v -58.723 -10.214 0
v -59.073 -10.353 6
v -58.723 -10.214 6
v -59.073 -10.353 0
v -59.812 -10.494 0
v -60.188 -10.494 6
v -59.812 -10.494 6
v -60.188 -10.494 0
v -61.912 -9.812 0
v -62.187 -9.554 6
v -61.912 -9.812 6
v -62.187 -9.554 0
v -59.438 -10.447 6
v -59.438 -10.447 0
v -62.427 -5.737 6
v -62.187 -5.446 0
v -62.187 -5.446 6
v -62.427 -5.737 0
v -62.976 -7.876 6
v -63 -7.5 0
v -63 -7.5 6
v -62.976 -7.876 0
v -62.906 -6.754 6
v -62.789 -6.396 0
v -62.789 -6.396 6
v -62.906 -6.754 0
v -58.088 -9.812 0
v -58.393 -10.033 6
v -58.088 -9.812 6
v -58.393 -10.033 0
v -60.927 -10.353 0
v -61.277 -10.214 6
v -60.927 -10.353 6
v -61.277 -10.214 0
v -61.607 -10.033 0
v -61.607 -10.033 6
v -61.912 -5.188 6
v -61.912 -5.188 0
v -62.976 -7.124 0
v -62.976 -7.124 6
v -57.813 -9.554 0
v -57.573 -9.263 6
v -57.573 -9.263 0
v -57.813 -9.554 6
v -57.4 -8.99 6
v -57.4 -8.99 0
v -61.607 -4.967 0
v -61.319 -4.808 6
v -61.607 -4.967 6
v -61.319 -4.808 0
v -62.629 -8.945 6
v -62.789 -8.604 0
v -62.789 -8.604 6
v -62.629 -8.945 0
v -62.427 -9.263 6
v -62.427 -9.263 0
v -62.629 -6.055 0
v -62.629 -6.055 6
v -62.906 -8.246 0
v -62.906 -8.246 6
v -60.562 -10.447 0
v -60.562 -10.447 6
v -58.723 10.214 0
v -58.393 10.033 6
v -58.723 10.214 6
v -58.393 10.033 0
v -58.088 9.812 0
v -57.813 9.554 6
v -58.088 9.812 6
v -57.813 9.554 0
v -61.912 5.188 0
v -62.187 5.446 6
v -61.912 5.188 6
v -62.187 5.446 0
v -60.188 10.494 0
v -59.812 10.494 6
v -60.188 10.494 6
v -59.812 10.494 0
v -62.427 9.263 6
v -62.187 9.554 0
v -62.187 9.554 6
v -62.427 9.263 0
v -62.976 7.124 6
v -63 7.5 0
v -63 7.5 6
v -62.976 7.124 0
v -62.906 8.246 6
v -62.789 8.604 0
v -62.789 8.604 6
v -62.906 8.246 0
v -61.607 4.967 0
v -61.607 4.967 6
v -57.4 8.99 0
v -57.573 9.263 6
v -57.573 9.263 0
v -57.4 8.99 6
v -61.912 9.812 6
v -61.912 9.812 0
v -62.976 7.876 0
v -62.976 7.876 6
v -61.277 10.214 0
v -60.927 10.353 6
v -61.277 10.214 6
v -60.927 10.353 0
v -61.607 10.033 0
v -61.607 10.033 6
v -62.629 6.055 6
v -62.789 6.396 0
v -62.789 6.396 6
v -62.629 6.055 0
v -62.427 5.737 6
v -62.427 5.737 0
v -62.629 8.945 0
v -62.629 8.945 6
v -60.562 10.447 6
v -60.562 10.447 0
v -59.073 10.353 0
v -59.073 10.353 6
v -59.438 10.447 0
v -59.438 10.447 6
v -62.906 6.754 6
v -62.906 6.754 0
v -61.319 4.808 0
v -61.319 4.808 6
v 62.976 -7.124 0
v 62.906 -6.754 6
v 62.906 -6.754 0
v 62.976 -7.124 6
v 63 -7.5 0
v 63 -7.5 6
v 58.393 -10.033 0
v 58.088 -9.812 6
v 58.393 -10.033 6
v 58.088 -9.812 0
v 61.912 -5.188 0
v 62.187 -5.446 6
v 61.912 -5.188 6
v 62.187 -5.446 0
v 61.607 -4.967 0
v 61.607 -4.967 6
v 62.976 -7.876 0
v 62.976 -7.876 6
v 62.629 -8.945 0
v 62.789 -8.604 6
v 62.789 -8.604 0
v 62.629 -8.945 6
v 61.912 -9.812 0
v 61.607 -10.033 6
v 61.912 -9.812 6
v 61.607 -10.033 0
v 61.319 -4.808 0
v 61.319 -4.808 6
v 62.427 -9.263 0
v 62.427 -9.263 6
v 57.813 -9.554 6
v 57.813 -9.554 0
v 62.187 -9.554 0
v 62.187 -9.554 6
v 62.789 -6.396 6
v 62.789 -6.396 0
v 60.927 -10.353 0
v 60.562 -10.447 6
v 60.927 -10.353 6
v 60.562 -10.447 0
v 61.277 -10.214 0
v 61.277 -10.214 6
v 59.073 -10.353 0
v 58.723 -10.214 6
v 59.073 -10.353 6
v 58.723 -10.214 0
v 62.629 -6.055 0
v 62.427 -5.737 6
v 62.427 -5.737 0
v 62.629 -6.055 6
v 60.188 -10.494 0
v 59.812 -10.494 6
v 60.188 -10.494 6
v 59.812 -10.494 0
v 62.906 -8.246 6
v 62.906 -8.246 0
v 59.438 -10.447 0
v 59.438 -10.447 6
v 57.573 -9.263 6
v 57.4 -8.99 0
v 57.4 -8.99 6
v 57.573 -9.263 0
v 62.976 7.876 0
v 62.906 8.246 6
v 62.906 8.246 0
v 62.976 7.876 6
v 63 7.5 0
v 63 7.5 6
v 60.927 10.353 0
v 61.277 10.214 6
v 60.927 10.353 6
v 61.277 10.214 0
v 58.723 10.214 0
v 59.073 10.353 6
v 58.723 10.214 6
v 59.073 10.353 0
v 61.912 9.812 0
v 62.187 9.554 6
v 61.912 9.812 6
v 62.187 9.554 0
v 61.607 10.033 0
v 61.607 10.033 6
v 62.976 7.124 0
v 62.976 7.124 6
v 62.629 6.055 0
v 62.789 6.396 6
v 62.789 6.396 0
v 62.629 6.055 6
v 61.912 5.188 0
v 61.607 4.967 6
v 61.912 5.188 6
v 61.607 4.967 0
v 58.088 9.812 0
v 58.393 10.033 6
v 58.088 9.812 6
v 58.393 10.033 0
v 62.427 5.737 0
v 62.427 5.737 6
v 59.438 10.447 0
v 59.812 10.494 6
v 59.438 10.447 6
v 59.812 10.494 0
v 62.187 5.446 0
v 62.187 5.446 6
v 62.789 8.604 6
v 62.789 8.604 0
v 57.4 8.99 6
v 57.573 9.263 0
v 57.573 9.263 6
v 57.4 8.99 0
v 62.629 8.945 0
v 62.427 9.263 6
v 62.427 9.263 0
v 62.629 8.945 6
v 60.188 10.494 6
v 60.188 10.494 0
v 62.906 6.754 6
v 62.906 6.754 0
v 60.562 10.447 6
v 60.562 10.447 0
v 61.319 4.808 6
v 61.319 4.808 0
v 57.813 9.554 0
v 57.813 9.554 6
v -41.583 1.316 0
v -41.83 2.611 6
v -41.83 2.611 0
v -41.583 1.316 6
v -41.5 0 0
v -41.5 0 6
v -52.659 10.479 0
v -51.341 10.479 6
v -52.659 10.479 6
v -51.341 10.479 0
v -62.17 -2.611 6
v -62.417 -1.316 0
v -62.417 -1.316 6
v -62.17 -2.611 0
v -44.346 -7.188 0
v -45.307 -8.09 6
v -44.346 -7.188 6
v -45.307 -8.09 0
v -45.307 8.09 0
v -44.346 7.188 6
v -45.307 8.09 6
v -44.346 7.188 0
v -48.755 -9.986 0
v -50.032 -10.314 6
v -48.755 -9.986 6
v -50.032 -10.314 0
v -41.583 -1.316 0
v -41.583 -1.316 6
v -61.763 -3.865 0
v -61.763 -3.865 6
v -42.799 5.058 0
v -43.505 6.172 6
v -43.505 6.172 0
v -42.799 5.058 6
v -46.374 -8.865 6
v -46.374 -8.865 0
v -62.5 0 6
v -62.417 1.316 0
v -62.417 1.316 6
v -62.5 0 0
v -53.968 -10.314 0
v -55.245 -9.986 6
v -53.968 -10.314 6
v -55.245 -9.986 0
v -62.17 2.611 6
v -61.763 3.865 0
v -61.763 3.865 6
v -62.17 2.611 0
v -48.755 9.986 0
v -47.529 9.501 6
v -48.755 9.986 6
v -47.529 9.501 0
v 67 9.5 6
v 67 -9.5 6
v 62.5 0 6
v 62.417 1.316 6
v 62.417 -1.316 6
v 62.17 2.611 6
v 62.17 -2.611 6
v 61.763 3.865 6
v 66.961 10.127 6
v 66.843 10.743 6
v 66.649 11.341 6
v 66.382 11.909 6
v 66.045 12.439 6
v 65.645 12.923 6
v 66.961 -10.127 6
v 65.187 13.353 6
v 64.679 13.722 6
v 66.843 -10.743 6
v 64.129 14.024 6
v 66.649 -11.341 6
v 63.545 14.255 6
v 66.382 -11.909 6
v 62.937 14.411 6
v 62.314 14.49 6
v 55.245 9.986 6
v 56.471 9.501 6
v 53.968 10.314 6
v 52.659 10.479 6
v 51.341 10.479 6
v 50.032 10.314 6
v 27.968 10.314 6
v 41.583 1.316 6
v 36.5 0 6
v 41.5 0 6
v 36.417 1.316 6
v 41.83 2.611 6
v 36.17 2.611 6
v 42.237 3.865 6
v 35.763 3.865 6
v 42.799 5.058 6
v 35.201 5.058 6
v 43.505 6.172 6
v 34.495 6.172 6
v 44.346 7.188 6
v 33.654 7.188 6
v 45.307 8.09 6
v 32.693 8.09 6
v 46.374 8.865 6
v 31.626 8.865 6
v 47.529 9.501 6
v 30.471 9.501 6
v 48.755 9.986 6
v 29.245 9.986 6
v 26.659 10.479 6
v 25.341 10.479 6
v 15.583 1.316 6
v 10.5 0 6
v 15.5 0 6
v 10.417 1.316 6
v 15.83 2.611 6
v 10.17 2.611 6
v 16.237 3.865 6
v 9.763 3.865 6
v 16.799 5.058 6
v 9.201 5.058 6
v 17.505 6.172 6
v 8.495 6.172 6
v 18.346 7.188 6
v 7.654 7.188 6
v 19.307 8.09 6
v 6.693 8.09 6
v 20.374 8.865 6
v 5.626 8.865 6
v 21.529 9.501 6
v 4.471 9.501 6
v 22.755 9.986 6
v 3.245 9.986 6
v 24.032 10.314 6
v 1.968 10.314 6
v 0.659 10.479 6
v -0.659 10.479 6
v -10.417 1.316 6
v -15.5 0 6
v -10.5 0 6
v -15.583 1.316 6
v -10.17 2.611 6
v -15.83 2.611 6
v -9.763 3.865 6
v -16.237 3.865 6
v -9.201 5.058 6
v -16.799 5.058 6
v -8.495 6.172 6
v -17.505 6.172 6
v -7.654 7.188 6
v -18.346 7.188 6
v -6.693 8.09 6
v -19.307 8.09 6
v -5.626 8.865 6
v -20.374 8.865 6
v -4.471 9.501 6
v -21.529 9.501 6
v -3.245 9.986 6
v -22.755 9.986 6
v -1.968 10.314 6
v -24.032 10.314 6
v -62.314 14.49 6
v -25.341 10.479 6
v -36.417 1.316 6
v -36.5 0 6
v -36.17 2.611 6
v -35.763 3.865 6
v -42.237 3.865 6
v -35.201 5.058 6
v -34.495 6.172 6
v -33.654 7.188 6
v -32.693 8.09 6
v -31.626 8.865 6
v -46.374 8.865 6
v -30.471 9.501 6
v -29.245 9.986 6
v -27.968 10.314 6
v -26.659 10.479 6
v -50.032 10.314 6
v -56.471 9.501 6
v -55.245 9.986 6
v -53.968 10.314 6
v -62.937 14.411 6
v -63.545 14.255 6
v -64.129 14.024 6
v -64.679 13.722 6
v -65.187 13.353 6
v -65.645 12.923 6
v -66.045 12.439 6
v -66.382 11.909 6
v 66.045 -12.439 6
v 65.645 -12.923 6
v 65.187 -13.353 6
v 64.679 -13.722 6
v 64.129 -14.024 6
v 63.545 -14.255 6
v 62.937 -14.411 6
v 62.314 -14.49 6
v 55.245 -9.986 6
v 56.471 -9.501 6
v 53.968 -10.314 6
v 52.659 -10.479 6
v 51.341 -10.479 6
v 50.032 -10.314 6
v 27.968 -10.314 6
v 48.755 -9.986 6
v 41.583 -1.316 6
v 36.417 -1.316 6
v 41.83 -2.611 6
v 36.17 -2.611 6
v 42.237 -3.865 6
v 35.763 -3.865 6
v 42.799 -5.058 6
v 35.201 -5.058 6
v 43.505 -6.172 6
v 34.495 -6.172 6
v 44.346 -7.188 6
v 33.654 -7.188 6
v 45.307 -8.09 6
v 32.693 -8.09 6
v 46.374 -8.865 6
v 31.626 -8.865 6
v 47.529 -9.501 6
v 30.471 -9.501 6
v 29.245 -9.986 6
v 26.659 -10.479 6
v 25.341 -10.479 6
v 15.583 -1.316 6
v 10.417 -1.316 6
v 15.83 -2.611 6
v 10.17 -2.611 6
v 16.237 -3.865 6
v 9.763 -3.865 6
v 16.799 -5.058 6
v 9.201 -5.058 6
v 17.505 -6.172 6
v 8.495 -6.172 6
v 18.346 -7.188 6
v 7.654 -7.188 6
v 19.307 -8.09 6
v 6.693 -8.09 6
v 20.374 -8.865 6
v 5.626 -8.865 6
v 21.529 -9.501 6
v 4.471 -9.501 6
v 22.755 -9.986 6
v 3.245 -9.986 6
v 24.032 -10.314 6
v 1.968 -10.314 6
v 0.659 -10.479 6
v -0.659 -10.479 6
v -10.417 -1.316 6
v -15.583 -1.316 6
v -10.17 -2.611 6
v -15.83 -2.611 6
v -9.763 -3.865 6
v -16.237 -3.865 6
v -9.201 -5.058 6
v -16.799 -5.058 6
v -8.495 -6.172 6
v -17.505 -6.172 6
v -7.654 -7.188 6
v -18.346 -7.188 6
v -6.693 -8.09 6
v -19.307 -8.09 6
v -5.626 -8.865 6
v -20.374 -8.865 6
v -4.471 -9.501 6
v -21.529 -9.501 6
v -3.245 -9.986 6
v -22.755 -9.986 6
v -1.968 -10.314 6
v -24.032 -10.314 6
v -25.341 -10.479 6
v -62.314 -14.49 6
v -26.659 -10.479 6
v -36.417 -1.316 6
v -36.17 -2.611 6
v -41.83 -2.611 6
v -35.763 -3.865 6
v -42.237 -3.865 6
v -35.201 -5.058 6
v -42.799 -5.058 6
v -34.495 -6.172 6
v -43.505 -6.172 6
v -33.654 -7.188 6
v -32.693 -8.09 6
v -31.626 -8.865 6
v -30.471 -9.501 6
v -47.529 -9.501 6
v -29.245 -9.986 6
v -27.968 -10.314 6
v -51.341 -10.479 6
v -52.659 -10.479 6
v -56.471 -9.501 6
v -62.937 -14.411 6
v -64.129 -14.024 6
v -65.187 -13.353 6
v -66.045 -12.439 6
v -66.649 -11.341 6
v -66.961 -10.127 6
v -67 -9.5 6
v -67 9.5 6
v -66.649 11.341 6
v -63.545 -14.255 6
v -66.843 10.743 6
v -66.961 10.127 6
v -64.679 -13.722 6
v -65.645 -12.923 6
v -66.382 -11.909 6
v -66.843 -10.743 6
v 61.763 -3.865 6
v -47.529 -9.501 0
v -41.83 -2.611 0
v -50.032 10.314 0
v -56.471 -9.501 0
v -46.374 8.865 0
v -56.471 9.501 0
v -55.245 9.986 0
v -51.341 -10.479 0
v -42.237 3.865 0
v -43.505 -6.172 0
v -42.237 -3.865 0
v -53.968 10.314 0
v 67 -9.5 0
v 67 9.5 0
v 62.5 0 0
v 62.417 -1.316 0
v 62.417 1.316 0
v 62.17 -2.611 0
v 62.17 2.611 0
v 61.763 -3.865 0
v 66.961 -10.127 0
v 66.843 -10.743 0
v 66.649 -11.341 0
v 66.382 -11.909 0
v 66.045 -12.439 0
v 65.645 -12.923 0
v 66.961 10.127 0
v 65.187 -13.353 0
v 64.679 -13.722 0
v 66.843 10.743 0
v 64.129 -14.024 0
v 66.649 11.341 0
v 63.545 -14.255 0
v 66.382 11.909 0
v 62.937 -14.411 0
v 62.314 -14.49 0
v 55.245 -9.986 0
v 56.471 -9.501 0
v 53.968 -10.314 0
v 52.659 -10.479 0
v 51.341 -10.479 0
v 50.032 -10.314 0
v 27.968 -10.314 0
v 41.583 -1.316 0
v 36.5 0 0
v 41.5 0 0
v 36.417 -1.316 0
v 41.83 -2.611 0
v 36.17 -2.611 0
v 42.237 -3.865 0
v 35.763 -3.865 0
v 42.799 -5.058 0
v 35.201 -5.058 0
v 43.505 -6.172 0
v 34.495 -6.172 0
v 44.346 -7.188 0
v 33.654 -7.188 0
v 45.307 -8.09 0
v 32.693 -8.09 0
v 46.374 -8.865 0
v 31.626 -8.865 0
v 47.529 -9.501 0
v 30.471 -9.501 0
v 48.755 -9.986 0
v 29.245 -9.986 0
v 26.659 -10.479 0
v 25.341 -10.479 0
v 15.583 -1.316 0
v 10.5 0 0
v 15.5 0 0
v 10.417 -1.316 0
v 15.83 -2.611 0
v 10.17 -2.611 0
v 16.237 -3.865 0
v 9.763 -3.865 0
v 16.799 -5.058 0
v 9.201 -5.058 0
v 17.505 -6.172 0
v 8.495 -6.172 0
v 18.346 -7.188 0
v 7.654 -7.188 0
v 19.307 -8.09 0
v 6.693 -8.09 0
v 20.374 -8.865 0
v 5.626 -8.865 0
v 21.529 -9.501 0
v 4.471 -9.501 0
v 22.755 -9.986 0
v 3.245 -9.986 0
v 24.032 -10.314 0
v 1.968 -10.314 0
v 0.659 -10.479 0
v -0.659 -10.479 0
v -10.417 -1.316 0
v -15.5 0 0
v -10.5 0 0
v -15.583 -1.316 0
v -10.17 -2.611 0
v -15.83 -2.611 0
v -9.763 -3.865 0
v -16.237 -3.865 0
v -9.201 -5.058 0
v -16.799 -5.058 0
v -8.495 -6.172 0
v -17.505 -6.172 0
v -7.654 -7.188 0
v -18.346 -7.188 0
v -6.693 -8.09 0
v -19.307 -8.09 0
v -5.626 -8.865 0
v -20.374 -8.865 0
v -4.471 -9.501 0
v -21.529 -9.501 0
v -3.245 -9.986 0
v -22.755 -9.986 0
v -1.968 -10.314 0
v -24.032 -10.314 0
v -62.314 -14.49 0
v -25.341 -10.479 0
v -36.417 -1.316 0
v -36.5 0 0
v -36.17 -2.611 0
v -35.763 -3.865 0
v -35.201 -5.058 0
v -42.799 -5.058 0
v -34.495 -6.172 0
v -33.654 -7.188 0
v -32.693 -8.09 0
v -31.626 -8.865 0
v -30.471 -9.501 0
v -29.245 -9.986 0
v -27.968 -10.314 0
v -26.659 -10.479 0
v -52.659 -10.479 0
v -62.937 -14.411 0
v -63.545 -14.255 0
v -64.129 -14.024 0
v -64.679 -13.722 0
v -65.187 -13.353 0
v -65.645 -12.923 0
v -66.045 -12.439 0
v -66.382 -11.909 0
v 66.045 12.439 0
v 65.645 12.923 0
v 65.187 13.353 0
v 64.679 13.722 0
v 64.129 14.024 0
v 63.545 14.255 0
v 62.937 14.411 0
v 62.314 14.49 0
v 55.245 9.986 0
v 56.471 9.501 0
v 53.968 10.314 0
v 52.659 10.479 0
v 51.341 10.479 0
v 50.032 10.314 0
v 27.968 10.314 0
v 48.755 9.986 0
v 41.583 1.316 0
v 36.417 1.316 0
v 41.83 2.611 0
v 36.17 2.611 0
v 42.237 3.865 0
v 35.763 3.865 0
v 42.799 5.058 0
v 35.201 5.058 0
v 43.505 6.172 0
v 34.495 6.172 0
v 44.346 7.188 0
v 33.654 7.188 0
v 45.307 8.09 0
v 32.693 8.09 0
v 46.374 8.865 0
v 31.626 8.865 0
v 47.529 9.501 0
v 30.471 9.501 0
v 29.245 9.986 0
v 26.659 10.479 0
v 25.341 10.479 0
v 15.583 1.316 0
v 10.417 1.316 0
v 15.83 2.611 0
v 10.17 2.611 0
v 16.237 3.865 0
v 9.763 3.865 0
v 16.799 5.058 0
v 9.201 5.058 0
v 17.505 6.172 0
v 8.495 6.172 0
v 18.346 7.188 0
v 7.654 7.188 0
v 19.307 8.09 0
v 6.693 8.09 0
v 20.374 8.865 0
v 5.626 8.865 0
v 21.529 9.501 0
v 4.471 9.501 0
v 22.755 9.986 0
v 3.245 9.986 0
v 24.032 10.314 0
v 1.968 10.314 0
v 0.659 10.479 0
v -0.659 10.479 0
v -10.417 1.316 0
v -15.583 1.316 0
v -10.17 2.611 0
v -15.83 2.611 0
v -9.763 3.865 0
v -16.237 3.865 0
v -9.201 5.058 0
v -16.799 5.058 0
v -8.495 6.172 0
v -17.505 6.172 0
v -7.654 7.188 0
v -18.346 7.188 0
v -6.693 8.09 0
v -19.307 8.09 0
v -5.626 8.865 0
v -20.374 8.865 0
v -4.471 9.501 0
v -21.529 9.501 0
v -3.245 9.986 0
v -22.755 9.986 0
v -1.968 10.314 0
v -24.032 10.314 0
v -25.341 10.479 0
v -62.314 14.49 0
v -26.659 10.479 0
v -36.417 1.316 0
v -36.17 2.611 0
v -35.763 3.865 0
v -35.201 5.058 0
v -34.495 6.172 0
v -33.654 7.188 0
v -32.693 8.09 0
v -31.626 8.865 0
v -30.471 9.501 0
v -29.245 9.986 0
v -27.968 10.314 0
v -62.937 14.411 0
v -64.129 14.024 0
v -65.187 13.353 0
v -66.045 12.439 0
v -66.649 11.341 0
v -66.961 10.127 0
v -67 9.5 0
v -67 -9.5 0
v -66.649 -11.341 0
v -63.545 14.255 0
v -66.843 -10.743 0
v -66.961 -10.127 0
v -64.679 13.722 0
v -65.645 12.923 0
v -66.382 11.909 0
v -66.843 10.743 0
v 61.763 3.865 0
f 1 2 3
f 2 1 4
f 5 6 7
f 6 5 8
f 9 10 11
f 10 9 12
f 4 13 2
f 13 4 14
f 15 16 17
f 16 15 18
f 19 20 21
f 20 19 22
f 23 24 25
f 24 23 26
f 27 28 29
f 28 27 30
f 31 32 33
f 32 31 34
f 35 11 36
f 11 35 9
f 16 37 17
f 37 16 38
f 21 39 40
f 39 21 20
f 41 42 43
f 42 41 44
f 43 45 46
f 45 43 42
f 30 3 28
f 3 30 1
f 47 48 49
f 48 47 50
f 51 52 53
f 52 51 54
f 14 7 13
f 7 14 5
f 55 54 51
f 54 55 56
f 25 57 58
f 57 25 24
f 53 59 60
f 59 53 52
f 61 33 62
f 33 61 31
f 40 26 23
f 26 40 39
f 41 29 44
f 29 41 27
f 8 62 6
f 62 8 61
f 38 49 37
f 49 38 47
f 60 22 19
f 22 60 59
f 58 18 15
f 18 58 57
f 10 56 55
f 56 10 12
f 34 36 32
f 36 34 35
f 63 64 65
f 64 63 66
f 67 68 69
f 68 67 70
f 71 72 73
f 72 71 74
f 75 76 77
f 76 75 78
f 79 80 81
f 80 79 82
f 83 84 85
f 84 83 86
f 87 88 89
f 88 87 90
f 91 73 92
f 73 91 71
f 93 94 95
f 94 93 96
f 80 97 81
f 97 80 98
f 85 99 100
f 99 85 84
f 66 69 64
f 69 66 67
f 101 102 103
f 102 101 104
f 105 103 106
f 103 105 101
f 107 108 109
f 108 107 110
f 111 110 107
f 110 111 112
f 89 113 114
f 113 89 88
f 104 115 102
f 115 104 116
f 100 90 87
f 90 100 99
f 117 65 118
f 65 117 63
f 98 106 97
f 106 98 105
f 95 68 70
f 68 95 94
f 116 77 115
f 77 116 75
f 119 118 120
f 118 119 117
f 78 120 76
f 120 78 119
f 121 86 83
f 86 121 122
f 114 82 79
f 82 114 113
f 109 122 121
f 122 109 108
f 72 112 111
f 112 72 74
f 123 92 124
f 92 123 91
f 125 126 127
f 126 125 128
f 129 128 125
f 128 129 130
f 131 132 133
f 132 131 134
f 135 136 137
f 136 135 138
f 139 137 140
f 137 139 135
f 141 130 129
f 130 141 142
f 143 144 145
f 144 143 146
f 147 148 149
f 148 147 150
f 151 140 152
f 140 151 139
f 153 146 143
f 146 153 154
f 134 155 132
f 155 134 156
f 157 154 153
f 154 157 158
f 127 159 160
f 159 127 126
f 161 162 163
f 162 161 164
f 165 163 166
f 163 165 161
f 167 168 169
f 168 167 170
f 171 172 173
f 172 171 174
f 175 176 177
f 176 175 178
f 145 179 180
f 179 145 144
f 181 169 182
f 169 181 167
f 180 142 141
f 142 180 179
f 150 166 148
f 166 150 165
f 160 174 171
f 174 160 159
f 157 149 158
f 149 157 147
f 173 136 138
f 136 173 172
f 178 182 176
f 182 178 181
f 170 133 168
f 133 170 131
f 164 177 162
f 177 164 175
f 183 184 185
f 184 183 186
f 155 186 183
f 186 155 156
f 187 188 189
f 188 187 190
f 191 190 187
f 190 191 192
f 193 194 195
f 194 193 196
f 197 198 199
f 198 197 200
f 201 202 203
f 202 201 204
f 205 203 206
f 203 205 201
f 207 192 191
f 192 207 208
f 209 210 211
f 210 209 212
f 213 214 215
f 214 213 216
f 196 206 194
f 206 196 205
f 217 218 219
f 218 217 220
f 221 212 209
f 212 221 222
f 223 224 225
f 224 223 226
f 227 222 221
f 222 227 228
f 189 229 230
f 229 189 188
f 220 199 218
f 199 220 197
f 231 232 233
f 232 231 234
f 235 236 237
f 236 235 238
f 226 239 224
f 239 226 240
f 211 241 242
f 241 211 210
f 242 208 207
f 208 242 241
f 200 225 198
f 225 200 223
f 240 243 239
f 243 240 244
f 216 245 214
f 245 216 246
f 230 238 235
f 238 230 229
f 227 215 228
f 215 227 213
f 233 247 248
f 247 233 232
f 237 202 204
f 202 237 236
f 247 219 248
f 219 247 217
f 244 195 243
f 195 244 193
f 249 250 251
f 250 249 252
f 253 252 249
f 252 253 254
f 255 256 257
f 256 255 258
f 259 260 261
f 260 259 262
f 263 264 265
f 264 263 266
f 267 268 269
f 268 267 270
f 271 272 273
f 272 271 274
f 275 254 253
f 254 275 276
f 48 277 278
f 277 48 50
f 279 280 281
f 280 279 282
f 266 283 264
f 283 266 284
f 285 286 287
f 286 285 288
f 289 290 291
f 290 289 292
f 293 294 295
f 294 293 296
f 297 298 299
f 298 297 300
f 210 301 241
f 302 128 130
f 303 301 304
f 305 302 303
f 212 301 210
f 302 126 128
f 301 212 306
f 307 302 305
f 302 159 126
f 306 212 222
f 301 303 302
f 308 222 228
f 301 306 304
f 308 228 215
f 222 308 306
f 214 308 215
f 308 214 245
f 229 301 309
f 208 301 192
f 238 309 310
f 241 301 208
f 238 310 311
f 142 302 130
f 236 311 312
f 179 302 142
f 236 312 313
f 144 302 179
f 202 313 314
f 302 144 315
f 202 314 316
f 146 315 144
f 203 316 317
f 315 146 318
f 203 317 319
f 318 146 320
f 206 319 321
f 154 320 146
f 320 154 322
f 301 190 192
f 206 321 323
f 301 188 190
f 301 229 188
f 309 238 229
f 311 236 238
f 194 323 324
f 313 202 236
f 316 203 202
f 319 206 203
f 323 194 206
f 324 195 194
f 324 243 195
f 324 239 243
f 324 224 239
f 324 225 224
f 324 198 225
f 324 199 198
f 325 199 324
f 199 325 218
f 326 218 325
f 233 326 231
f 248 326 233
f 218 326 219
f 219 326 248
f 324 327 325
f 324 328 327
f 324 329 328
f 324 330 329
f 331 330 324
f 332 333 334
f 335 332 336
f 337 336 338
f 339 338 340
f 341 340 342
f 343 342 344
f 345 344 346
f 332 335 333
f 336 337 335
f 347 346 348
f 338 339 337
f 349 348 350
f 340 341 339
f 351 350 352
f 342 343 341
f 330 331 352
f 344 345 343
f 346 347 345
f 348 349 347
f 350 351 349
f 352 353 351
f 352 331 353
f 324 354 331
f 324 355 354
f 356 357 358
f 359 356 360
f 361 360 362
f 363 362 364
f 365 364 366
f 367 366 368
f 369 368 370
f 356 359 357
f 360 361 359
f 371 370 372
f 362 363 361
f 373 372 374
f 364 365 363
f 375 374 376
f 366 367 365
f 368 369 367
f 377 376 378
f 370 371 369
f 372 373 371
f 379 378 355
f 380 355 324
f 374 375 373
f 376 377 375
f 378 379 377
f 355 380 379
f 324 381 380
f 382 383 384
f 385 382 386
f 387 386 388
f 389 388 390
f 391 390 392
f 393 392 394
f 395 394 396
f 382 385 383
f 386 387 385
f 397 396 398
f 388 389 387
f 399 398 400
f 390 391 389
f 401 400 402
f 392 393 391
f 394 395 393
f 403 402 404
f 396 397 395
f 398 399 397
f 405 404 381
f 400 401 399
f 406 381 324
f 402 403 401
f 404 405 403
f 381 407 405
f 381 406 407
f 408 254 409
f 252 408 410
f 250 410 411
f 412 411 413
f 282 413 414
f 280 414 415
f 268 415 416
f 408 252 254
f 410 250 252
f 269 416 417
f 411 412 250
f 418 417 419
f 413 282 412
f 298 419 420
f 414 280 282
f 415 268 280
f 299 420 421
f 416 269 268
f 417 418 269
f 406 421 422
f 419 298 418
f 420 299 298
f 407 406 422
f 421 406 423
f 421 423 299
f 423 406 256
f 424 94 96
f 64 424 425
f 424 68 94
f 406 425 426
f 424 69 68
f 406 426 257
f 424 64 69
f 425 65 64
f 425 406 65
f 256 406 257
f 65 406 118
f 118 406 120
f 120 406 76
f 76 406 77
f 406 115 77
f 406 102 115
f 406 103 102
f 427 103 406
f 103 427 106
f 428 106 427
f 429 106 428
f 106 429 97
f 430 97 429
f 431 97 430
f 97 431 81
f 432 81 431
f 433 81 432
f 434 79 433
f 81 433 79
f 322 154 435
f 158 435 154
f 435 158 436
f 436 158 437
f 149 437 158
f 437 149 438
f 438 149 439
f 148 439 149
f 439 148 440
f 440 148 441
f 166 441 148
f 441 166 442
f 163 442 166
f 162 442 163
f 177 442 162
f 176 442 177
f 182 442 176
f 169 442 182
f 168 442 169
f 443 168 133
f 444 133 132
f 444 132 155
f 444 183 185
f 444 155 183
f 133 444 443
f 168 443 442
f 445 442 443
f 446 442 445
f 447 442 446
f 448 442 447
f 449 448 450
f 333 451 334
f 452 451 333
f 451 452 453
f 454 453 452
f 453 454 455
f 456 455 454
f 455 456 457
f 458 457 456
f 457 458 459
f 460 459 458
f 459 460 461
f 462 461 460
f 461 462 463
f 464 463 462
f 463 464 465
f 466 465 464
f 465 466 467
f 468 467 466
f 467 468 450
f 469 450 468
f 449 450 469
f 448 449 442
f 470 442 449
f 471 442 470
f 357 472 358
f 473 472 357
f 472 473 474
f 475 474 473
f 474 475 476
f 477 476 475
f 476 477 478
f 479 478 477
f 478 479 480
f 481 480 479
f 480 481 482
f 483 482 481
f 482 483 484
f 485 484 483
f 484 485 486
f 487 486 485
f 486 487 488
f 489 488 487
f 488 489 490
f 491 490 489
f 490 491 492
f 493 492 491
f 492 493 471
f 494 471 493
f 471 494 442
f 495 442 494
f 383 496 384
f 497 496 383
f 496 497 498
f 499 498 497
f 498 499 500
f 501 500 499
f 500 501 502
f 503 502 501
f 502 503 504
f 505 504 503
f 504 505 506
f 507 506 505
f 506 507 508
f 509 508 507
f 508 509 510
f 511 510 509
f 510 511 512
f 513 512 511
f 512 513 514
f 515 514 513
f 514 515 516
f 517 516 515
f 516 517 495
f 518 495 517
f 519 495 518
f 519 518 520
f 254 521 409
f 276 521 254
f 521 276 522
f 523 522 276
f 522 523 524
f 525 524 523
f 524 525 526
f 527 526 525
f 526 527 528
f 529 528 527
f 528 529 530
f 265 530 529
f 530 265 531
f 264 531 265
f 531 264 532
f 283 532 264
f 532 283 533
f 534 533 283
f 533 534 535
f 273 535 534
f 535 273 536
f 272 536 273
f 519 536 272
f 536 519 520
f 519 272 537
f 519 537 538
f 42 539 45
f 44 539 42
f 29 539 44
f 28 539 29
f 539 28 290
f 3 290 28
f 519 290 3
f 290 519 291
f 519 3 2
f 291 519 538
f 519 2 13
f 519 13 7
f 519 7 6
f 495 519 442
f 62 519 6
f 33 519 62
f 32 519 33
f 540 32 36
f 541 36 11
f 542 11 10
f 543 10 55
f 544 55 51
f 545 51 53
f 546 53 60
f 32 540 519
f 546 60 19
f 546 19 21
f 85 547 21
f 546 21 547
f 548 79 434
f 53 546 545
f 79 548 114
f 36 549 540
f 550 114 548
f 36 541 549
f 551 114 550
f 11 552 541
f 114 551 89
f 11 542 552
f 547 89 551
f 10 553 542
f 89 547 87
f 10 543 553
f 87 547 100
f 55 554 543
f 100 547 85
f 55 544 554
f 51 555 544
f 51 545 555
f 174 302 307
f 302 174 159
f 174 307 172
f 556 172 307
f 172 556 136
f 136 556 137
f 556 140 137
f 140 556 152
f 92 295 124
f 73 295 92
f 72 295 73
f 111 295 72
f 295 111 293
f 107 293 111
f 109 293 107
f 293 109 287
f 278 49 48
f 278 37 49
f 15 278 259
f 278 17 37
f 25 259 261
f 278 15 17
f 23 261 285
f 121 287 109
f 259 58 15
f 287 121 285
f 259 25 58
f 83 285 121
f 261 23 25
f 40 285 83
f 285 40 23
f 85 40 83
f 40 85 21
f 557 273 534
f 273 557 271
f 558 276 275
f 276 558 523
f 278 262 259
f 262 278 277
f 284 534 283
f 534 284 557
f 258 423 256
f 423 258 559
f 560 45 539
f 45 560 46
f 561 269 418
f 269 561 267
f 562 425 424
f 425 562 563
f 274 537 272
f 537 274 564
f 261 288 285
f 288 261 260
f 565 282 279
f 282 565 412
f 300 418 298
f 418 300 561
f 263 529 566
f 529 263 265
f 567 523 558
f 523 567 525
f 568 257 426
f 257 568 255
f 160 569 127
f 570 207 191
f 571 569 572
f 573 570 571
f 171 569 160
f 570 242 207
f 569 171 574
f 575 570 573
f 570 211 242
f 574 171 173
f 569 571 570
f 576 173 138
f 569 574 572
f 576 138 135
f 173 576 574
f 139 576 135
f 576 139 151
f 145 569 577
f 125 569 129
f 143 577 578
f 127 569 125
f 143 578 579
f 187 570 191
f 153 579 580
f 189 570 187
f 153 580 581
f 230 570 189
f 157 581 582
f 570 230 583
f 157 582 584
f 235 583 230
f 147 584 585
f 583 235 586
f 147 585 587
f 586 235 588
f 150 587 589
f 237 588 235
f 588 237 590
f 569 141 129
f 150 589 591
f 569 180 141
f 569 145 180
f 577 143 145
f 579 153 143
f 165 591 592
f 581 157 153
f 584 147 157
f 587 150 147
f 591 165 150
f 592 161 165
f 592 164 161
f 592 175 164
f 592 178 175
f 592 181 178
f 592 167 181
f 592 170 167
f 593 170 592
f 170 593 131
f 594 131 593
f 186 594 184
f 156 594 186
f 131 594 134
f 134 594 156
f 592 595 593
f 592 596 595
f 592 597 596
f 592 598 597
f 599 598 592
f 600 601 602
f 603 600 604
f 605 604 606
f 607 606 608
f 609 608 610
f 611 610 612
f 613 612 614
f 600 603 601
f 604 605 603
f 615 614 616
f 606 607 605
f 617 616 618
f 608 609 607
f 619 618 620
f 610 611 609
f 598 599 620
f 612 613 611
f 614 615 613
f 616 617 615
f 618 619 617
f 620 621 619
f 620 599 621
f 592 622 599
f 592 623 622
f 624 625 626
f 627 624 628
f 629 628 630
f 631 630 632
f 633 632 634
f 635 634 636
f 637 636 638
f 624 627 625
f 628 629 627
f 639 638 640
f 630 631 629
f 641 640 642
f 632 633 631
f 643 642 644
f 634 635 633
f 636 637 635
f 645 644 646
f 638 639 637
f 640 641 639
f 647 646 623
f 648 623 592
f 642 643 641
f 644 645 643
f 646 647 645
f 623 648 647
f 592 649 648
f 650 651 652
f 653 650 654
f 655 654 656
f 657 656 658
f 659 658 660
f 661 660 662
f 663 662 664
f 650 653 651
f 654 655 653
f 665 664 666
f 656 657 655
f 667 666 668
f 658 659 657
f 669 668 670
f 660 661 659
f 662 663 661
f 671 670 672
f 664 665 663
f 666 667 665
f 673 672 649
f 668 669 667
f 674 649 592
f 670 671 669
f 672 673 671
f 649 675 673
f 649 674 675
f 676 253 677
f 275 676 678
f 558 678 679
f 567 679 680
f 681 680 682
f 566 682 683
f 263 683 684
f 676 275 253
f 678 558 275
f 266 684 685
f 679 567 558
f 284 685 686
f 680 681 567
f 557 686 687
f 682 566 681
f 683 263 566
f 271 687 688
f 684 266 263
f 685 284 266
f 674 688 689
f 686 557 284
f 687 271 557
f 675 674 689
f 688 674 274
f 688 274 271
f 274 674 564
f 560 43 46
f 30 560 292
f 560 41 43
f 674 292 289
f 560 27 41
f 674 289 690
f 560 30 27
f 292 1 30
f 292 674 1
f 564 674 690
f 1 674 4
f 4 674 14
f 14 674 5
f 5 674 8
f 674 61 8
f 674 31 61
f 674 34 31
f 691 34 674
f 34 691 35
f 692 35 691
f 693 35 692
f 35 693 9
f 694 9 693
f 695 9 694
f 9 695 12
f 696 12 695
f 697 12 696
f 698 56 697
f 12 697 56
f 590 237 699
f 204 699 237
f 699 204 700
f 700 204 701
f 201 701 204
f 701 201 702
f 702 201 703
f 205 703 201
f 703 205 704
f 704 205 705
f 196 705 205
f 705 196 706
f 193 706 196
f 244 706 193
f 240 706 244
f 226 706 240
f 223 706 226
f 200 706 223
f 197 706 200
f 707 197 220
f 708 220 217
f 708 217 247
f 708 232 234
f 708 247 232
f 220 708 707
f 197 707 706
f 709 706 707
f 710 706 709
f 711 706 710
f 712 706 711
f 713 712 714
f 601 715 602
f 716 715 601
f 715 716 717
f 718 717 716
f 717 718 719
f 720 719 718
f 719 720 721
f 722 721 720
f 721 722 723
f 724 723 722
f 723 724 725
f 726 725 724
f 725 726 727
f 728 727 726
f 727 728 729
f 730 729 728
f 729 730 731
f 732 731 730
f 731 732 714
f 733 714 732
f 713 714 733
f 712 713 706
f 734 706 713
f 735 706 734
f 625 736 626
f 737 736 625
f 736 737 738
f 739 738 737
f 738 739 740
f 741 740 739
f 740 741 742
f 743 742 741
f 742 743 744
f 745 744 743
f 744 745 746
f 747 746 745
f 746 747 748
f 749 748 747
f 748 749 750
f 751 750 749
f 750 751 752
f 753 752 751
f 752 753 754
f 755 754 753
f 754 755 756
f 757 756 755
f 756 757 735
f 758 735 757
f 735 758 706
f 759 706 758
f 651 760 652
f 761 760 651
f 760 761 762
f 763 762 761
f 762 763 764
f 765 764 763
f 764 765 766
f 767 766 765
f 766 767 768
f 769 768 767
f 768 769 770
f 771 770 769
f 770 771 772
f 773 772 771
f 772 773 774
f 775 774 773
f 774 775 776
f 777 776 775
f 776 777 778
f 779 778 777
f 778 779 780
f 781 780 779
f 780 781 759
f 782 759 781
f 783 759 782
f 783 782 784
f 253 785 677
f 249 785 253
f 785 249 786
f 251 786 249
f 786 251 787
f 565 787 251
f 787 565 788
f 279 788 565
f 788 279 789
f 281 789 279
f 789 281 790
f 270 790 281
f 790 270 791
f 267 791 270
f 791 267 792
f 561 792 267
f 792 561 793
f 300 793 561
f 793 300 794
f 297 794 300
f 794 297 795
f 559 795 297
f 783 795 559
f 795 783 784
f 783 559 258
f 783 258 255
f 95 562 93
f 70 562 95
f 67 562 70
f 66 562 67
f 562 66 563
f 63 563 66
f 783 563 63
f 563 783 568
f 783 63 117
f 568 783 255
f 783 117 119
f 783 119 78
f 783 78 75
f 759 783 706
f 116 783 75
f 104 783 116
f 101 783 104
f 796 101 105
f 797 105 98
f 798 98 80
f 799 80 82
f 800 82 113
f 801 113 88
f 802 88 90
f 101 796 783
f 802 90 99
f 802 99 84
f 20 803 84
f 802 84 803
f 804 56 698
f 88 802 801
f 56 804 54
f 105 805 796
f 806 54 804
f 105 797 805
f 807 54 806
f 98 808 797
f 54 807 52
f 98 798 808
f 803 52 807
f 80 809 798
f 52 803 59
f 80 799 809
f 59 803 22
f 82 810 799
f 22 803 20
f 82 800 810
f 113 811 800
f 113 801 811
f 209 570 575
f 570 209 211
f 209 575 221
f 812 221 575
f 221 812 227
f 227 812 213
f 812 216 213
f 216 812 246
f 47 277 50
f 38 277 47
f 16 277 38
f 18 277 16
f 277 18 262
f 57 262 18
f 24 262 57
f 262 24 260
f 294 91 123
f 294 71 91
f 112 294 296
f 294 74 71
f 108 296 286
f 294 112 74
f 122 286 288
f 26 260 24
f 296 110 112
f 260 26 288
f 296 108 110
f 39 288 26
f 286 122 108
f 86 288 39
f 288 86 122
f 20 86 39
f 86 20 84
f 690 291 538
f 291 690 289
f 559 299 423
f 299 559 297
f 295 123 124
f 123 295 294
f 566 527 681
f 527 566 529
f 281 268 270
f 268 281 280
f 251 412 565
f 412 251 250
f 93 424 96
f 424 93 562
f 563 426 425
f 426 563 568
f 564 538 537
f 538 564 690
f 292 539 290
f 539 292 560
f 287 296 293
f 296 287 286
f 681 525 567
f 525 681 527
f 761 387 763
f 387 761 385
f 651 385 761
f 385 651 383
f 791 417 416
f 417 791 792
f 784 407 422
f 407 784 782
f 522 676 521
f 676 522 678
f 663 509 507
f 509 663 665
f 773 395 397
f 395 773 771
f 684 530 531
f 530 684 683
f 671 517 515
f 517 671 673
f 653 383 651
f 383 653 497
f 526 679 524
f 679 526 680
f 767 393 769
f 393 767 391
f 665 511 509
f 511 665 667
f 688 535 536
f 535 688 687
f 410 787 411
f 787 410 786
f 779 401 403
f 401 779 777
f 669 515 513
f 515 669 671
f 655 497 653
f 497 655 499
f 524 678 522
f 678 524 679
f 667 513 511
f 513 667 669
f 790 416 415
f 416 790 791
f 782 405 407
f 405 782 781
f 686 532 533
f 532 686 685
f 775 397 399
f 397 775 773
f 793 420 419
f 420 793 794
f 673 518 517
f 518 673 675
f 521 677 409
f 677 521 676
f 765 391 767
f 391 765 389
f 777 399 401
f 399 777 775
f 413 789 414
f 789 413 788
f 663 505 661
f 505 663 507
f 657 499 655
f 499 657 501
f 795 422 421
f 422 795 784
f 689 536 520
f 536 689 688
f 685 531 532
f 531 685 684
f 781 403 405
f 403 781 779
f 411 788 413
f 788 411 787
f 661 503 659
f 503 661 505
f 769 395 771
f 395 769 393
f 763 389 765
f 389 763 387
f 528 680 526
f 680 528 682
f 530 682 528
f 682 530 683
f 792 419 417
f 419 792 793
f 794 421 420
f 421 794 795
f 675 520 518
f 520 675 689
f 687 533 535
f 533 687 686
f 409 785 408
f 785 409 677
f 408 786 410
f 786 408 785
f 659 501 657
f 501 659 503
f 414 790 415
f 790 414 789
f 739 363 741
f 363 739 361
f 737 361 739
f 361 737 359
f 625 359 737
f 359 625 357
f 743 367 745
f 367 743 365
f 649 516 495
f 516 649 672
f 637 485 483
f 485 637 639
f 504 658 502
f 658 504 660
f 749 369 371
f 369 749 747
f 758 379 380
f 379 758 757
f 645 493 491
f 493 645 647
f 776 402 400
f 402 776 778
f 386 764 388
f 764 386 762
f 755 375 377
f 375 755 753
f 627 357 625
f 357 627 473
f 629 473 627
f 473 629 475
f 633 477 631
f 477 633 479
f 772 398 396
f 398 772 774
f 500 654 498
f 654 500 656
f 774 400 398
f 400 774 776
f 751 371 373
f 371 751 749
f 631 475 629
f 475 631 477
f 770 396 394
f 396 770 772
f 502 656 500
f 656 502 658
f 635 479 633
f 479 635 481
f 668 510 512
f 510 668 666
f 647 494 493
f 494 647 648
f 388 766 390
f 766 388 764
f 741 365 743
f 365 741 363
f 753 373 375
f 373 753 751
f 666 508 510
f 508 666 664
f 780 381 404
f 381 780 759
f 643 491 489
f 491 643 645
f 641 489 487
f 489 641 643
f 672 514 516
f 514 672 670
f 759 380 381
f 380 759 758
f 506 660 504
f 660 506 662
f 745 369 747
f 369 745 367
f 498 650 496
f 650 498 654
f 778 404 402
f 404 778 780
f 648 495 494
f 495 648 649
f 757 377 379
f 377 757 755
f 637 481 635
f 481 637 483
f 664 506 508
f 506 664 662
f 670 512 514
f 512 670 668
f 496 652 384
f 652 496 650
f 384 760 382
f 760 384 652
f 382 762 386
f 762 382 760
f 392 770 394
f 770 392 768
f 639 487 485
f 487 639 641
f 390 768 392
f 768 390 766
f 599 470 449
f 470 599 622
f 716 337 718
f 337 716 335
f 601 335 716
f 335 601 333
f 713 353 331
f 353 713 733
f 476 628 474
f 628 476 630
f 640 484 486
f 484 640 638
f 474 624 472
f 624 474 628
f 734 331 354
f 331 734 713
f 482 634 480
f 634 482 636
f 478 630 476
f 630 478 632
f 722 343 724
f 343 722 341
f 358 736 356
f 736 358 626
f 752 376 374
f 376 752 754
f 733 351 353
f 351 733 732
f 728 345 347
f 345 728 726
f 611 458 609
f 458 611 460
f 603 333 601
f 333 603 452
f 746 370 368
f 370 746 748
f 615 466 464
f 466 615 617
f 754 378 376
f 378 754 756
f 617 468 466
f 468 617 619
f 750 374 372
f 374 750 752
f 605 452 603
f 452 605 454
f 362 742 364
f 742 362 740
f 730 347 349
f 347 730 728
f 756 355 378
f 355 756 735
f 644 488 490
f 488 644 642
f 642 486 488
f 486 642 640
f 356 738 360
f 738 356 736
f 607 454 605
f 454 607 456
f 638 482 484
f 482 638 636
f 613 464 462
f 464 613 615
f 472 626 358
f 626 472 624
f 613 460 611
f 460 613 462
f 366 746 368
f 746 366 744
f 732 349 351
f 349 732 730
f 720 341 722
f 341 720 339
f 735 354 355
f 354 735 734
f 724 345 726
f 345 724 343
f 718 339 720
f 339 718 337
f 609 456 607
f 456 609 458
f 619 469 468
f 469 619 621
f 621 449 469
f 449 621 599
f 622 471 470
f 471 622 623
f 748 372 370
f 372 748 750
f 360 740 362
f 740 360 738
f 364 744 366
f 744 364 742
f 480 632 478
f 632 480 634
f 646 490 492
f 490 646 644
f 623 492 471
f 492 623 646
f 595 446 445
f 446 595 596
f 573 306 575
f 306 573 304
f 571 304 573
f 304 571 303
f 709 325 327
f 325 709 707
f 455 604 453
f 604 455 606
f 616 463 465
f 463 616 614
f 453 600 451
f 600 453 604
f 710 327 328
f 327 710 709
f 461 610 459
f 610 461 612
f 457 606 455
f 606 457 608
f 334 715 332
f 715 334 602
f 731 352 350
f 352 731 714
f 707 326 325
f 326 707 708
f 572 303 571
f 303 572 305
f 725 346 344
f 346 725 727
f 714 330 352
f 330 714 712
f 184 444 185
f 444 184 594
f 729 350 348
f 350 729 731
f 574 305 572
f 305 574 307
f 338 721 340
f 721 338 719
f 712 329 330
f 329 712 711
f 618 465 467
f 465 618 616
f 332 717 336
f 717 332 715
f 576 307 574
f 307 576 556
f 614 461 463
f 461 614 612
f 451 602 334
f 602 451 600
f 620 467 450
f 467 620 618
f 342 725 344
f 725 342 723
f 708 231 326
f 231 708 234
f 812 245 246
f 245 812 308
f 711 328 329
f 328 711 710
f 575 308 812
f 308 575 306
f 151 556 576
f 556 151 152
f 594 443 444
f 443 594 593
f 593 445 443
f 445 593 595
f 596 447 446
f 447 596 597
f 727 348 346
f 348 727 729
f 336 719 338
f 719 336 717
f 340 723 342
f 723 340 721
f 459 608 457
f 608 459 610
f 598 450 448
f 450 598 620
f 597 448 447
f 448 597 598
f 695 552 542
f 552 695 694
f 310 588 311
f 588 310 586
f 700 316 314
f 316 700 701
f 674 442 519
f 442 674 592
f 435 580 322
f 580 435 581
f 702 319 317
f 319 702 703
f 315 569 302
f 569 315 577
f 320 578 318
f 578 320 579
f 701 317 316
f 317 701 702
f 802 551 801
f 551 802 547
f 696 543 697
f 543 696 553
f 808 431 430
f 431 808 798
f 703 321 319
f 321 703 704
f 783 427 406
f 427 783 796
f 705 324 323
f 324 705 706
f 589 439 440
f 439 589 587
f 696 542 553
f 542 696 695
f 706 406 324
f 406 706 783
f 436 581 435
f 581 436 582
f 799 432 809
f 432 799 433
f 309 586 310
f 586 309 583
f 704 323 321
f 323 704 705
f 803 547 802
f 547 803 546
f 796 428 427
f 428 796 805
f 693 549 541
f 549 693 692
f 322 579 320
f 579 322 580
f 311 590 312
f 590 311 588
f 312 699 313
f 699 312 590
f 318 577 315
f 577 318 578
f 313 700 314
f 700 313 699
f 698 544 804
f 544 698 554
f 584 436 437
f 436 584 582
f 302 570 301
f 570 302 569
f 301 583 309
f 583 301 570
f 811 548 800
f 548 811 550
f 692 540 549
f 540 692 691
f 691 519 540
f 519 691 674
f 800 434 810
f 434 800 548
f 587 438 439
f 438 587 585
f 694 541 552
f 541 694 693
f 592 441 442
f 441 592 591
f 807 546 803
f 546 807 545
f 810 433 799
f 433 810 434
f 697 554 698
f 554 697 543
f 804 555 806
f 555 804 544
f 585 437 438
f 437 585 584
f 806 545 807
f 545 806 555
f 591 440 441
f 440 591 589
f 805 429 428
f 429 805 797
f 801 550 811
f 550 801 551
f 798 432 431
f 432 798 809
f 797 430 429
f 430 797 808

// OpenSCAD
$fn = 50;


difference() {
	union() {
		hull() {
			translate(v = [-62.0000000000, 9.5000000000, 0]) {
				cylinder(h = 6, r = 5);
			}
			translate(v = [62.0000000000, 9.5000000000, 0]) {
				cylinder(h = 6, r = 5);
			}
			translate(v = [-62.0000000000, -9.5000000000, 0]) {
				cylinder(h = 6, r = 5);
			}
			translate(v = [62.0000000000, -9.5000000000, 0]) {
				cylinder(h = 6, r = 5);
			}
		}
	}
	union() {
		#translate(v = [-60.0000000000, -7.5000000000, -100.0000000000]) {
			cylinder(h = 200, r = 3.0000000000);
		}
		#translate(v = [-60.0000000000, 7.5000000000, -100.0000000000]) {
			cylinder(h = 200, r = 3.0000000000);
		}
		#translate(v = [60.0000000000, -7.5000000000, -100.0000000000]) {
			cylinder(h = 200, r = 3.0000000000);
		}
		#translate(v = [60.0000000000, 7.5000000000, -100.0000000000]) {
			cylinder(h = 200, r = 3.0000000000);
		}
		#translate(v = [-52.0000000000, 0, 0]) {
			cylinder(h = 6, r = 10.5000000000);
		}
		#translate(v = [-26.0000000000, 0, 0]) {
			cylinder(h = 6, r = 10.5000000000);
		}
		#cylinder(h = 6, r = 10.5000000000);
		#translate(v = [26.0000000000, 0, 0]) {
			cylinder(h = 6, r = 10.5000000000);
		}
		#translate(v = [52.0000000000, 0, 0]) {
			cylinder(h = 6, r = 10.5000000000);
		}
	}
}
